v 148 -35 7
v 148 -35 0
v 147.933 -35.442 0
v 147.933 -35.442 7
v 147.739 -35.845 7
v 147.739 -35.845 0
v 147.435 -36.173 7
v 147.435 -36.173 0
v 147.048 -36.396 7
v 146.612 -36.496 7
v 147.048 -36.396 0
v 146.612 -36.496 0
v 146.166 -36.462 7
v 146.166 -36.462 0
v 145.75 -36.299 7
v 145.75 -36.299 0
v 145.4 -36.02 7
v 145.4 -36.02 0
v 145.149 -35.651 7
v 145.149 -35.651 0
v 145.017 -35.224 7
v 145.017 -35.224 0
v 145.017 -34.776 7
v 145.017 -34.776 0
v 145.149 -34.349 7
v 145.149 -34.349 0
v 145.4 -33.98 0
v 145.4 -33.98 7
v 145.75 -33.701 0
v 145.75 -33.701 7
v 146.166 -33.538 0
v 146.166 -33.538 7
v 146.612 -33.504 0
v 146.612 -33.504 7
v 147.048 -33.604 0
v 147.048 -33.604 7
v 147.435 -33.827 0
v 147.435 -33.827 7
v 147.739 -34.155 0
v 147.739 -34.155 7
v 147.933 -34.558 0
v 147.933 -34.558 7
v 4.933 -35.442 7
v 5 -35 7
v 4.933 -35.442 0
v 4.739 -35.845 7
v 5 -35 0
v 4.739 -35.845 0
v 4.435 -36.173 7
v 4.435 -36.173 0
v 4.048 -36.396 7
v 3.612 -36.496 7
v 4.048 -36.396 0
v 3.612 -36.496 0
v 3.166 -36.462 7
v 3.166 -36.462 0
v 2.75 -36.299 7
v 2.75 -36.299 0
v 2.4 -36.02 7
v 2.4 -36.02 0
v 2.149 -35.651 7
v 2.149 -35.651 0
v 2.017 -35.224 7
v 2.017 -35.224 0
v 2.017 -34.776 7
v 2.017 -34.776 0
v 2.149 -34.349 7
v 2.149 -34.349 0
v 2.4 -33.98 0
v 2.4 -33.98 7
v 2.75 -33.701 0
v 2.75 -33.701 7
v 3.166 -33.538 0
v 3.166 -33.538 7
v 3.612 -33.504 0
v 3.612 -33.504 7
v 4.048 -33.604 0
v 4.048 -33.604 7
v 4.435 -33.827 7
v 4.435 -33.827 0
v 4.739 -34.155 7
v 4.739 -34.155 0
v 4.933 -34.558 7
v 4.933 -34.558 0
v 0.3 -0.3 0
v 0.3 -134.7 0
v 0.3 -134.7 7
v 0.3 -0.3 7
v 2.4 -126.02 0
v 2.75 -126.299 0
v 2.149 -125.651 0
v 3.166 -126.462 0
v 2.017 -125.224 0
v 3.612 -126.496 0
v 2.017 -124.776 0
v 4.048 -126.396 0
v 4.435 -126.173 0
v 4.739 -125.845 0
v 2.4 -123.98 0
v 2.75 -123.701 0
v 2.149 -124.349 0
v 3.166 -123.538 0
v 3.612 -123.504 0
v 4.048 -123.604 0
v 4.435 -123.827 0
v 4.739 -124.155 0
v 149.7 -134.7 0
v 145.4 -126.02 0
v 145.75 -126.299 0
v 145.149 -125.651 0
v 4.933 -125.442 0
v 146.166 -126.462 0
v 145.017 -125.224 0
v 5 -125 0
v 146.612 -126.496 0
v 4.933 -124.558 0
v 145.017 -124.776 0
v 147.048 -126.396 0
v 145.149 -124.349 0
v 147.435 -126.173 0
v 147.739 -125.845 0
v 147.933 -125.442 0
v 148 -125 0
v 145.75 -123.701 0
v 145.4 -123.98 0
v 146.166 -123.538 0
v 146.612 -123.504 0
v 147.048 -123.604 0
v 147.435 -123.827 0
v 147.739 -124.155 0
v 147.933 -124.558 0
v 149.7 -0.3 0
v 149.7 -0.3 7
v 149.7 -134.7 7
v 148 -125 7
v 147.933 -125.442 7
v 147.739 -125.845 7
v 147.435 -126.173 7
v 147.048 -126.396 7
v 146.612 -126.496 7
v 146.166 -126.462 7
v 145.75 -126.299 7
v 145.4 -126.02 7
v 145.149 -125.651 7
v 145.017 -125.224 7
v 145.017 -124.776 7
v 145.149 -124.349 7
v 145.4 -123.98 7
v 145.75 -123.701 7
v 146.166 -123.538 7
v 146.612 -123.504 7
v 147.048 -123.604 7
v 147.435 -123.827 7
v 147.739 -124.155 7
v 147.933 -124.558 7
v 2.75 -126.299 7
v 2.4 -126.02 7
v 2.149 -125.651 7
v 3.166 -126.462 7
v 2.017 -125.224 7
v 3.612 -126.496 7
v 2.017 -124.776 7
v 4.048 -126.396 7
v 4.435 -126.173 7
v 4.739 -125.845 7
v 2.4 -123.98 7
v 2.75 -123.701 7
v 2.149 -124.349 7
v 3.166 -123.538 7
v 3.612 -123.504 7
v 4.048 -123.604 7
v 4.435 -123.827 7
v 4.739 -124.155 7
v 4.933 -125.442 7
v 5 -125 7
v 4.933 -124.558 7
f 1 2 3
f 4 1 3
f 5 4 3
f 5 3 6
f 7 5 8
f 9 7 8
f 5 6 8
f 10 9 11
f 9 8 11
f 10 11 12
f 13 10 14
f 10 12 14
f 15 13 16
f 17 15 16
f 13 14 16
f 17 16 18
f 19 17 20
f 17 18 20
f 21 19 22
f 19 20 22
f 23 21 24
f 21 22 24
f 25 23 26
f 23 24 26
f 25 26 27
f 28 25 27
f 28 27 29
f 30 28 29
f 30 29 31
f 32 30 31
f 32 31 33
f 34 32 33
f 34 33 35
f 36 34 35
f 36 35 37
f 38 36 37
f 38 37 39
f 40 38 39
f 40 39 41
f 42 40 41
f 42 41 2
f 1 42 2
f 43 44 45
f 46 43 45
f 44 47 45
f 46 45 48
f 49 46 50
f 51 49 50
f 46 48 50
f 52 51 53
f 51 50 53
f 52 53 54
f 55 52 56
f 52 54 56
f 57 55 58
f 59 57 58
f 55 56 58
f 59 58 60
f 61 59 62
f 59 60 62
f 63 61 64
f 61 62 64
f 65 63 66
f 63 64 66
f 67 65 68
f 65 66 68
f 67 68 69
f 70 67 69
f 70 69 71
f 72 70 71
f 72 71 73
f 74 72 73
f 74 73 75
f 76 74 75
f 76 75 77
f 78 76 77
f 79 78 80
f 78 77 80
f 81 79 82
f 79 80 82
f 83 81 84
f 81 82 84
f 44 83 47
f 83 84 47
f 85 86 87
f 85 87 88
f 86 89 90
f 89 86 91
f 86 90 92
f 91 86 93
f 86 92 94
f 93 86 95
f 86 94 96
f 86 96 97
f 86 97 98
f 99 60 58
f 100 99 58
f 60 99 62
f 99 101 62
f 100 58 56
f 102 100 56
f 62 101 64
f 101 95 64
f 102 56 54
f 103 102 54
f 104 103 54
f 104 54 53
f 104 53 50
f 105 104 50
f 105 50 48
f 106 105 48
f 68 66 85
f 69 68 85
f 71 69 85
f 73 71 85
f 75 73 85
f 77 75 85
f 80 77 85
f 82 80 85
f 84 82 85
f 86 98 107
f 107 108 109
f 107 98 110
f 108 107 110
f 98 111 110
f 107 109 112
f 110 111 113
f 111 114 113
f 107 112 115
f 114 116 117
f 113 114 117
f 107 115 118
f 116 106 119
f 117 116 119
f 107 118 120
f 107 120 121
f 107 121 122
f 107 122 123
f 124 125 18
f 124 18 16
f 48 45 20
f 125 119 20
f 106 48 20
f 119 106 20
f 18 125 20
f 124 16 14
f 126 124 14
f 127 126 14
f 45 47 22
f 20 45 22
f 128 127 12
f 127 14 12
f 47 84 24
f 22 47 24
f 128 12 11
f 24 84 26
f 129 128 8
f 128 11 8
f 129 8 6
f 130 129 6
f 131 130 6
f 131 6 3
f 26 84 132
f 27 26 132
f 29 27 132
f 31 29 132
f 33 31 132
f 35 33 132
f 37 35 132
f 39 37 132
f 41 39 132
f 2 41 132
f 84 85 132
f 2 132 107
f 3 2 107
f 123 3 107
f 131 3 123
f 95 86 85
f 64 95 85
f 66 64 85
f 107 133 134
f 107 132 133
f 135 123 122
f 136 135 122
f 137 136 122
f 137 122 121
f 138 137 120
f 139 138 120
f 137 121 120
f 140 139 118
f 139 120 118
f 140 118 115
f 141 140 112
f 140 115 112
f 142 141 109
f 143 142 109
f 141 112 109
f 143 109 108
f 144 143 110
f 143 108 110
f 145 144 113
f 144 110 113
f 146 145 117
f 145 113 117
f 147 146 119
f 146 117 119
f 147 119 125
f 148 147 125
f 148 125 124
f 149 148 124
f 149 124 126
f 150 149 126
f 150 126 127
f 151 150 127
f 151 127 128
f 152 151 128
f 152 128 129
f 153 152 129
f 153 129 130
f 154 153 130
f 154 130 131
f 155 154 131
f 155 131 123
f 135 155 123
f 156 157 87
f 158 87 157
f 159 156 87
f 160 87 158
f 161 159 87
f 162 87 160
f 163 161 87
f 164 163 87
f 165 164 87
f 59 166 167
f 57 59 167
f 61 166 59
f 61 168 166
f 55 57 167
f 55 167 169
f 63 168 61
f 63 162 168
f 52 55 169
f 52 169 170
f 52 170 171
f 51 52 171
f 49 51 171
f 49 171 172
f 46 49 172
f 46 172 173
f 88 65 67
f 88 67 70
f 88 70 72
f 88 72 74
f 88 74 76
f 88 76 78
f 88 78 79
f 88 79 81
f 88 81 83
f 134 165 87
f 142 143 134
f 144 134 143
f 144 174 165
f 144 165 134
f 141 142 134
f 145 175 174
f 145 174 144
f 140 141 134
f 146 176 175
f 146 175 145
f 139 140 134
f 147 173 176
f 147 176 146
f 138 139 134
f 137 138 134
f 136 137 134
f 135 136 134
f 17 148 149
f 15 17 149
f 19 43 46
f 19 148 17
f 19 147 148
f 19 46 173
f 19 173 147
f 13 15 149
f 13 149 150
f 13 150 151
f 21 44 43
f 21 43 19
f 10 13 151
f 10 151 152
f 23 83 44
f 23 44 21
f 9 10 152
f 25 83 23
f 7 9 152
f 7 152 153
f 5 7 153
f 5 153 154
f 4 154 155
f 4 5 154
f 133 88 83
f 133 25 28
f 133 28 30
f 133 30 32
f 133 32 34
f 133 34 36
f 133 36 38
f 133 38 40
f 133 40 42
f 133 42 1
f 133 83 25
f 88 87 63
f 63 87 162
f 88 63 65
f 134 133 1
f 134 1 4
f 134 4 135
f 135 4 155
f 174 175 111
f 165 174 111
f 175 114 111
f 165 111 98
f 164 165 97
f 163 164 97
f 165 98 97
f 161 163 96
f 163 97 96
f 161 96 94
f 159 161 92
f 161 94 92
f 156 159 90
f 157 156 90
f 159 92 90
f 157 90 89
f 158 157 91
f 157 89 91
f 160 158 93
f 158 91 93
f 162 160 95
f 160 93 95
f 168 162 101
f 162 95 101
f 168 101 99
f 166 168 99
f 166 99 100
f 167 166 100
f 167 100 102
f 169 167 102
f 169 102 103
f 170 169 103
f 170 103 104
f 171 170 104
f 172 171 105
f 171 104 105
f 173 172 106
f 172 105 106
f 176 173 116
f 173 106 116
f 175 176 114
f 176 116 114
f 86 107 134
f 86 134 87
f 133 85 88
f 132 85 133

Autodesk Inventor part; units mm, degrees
ref_plane "YZ Plane" through (0, 0, 0) normal (1, 0, 0) x (0, 1, 0)
ref_plane "XZ Plane" through (0, 0, 0) normal (0, 1, 0) x (-1, 0, 0)
ref_plane "XY Plane" through (0, 0, 0) normal (0, 0, 1) x (1, 0, 0)
sketch "Sketch1" plane through (0, 0, 0) normal (0, 0, 1) x (1, 0, 0)
  line L0 (0, 0) -> (150, 0)
  line L1 (150, 0) -> (150, -135)
  line L2 (150, -135) -> (0, -135)
  line L3 (0, -135) -> (0, 0)
  circle A0 centre (3.5, -35) radius 1.5
  line L4 (75, 0) -> (75, -135)
  circle A1 centre (146.5, -35) radius 1.5
  circle A2 centre (3.5, -125) radius 1.5
  circle A3 centre (146.5, -125) radius 1.5
  dimension "d0" = 150
  dimension "d1" = 135
  dimension "d2" = 3
  dimension "d3" = 3.5
  dimension "d4" = 35
  dimension "d5" = 3
  dimension "d6" = 3.5
  dimension "d7" = 90
extrude "Extrusion1" add sketch "Sketch1" along normal blind 7
move faces "Move1" translate (0, -0.3, 0) faces at (100, 0, 2.3333)
move faces "Move2" translate (-0.3, 0, 0) faces at (150, -90.1, 2.3333)
move faces "Move3" translate (0, 0.3, 0) faces at (49.9, -135, 2.3333)
move faces "Move4" translate (0.3, 0, 0) faces at (0, -45.1, 2.3333)
properties part number "mávač_víčko"
